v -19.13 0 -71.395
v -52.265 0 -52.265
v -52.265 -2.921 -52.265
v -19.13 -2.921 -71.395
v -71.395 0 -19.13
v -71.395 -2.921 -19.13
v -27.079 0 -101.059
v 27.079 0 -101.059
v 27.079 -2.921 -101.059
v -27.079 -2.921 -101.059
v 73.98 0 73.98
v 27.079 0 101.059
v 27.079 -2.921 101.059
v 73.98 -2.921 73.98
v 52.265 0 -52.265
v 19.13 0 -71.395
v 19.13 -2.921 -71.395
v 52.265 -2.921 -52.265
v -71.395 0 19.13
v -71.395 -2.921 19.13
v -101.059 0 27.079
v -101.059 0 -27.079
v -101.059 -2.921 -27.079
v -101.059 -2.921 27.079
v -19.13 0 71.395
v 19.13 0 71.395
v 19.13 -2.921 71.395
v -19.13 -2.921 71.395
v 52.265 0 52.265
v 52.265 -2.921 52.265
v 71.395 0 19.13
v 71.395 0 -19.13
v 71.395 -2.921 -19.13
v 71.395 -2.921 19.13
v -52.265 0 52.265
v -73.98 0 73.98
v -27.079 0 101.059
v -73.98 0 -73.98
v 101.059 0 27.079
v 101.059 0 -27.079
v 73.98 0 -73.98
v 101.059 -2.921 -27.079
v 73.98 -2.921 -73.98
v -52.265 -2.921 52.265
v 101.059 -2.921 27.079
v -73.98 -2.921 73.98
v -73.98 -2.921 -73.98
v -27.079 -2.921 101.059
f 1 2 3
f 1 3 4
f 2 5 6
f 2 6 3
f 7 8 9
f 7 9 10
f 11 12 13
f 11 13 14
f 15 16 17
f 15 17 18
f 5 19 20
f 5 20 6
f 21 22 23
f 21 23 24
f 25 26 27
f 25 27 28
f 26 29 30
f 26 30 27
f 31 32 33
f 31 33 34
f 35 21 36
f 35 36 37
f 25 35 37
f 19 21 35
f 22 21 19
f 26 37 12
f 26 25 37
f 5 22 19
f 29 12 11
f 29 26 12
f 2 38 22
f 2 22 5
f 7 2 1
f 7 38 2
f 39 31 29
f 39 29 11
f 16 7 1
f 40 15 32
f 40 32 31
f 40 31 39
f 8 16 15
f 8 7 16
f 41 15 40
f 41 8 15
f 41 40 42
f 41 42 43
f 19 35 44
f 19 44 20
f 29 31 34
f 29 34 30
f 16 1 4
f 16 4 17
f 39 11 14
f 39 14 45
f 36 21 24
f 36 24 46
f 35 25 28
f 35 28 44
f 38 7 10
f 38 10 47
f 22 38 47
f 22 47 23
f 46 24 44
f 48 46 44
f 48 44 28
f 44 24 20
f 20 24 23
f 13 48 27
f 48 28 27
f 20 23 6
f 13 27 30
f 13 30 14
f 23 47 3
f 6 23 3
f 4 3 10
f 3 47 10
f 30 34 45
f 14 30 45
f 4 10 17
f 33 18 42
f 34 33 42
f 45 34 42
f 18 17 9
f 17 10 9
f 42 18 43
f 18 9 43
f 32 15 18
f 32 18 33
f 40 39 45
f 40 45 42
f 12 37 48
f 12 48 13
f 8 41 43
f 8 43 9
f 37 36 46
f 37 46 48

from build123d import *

# Parameters (mm, degrees)
BOSS_EXTRUDE1_DEPTH = 2.921
CUT_EXTRUDE1_DEPTH  = 139.818915977
BOSS_EXTRUDE2_DEPTH = 2.921


with BuildPart() as part:
    # Sketch1 → Boss-Extrude1 (new body)
    with BuildSketch(Plane(origin=(0, 0, 0), x_dir=(1, 0, 0), z_dir=(0, 1, 0))):
        Polygon((98.138063951, 26.296014982), (71.842048969, 71.842048969), (26.296014982, 98.138063951), (-26.296014982, 98.138063951), (-71.842048969, 71.842048969), (-98.138063951, 26.296014982), (-98.138063951, -26.296014982), (-71.842048969, -71.842048969), (-26.296014982, -98.138063951), (26.296014982, -98.138063951), (71.842048969, -71.842048969), (98.138063951, -26.296014982), align=None)
    extrude(amount=-BOSS_EXTRUDE1_DEPTH)

    # Sketch3 → Cut-Extrude1 (cut, through all)
    with BuildSketch(Plane(origin=(0, 0, 0), x_dir=(1, 0, 0), z_dir=(0, 1, 0))):
        Polygon((-71.395441524, 19.1303509), (-52.265090625, 52.265090625), (-19.1303509, 71.395441524), (19.1303509, 71.395441524), (52.265090625, 52.265090625), (71.395441524, 19.1303509), (71.395441524, -19.1303509), (52.265090625, -52.265090625), (19.1303509, -71.395441524), (-19.1303509, -71.395441524), (-52.265090625, -52.265090625), (-71.395441524, -19.1303509), align=None)
    extrude(amount=-CUT_EXTRUDE1_DEPTH, mode=Mode.SUBTRACT)

    # Sketch4 → Boss-Extrude2 (add)
    with BuildSketch(Plane(origin=(0, 0, 0), x_dir=(1, 0, 0), z_dir=(0, 1, 0))):
        Polygon((101.059063951, 27.078694574), (73.980369377, 73.980369377), (27.078694574, 101.059063951), (-27.078694574, 101.059063951), (-73.980369377, 73.980369377), (-101.059063951, 27.078694574), (-101.059063951, -27.078694574), (-73.980369377, -73.980369377), (-27.078694574, -101.059063951), (27.078694574, -101.059063951), (73.980369377, -73.980369377), (101.059063951, -27.078694574), align=None)
        Polygon((98.138063951, 26.296014982), (71.842048969, 71.842048969), (26.296014982, 98.138063951), (-26.296014982, 98.138063951), (-71.842048969, 71.842048969), (-98.138063951, 26.296014982), (-98.138063951, -26.296014982), (-71.842048969, -71.842048969), (-26.296014982, -98.138063951), (26.296014982, -98.138063951), (71.842048969, -71.842048969), (98.138063951, -26.296014982), align=None, mode=Mode.SUBTRACT)
    extrude(amount=-BOSS_EXTRUDE2_DEPTH)


solid = part.part
